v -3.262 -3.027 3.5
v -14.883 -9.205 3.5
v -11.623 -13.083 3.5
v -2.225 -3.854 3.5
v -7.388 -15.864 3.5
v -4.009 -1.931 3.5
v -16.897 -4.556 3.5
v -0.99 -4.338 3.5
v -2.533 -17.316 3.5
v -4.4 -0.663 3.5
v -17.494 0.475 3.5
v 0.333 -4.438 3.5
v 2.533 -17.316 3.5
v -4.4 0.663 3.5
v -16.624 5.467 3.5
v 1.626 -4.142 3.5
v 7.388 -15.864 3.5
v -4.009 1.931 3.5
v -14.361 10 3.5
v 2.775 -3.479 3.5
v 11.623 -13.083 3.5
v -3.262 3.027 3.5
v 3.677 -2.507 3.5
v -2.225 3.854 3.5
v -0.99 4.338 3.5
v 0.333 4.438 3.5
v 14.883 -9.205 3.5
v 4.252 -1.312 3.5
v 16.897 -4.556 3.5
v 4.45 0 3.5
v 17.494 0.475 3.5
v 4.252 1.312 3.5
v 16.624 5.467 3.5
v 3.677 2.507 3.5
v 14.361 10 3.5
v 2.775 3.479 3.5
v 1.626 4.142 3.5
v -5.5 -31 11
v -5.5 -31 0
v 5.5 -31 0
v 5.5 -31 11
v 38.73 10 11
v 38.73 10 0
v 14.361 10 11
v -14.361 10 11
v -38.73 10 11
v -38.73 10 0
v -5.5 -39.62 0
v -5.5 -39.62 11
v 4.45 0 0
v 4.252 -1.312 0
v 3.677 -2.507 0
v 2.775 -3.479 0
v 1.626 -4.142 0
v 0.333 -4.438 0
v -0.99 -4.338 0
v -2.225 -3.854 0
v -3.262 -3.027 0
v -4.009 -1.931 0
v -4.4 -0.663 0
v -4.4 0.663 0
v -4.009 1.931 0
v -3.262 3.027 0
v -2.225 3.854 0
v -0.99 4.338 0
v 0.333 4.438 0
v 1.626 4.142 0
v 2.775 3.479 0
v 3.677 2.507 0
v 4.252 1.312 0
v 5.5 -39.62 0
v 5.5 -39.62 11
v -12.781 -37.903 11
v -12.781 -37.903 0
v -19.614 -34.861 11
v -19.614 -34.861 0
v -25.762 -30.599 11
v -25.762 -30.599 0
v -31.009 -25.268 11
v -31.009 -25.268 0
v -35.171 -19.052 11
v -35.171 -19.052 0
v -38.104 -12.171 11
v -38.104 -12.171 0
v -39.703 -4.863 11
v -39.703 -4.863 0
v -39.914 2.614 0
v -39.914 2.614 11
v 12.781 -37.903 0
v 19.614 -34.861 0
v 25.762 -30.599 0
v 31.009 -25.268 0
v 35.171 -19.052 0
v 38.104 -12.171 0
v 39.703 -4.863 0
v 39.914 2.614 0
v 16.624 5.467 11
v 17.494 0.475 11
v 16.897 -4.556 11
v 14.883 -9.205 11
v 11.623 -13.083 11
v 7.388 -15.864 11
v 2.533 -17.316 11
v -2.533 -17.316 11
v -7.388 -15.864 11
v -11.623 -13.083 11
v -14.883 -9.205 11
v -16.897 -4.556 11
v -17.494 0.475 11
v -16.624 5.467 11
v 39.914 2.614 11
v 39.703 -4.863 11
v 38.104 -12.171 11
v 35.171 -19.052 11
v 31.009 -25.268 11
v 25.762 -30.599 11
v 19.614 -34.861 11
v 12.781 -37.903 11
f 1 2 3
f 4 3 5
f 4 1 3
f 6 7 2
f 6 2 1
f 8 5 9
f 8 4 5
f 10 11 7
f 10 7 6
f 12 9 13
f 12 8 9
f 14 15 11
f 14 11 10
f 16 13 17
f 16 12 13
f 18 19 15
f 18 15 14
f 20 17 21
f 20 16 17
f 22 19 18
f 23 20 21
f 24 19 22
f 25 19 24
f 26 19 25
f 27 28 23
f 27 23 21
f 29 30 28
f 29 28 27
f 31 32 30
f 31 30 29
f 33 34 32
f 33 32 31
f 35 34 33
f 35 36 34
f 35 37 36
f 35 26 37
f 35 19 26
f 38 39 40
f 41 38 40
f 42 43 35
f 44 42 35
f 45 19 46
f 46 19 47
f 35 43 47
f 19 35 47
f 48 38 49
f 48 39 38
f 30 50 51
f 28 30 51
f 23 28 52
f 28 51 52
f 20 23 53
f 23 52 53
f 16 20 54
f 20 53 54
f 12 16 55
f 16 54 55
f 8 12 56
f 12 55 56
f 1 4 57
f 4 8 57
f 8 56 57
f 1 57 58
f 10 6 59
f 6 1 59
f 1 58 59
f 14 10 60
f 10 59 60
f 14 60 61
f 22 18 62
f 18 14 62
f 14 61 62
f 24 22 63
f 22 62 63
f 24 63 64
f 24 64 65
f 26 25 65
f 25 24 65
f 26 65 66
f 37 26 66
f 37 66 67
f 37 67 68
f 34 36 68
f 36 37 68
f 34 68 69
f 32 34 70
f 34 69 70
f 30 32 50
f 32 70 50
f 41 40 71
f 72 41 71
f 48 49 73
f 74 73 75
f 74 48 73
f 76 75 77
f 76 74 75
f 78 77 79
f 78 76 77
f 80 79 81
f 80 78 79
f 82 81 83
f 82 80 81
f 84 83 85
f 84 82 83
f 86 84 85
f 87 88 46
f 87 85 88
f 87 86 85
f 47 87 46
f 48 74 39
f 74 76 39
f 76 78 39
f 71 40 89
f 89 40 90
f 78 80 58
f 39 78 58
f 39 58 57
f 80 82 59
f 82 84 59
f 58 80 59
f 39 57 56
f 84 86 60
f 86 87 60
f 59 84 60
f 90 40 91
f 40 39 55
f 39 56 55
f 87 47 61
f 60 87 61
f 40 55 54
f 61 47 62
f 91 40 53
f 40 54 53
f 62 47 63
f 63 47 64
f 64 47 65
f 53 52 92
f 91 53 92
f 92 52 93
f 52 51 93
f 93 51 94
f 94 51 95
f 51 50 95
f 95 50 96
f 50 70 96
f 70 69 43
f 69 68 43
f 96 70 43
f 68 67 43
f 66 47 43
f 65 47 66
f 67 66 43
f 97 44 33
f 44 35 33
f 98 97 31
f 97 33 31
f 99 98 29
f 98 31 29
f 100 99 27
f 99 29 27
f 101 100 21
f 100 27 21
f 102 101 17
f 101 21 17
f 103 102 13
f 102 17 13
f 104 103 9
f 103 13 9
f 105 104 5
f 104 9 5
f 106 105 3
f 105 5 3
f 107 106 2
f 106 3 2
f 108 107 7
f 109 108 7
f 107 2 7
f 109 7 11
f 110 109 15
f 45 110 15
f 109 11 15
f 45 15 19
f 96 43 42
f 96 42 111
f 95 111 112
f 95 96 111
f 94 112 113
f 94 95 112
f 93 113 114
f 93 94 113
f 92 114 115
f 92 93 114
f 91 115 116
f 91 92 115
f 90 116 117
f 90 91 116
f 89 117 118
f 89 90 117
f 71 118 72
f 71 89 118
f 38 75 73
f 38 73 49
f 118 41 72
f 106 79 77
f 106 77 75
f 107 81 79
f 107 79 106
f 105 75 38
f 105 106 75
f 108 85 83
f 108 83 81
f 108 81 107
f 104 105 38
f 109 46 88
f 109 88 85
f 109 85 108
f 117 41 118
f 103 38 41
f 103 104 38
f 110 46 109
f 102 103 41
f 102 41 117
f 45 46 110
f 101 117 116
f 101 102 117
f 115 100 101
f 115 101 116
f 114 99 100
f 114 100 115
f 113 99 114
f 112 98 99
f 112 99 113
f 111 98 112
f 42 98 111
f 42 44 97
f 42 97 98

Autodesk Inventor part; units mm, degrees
ref_plane "YZ Plane" through (0, 0, 0) normal (1, 0, 0) x (0, 1, 0)
ref_plane "XZ Plane" through (0, 0, 0) normal (0, 1, 0) x (-1, 0, 0)
ref_plane "XY Plane" through (0, 0, 0) normal (0, 0, 1) x (1, 0, 0)
sketch "Эскиз1" plane through (0, 0, 0) normal (0, 0, 1) x (1, 0, 0)
  line L0 (0, 0) -> (-6, 0) construction
  line L1 (-6, 0) -> (-6, -27.9727) construction
  line L2 (-6, -27.9727) -> (0, -27.9727) construction
  line L3 (0, -27.9727) -> (0, 0) construction
  line L4 (6, -39.5474) -> (6, -29.5474)
  line L5 (6, -29.5474) -> (-6, -29.5474)
  line L6 (-6, -29.5474) -> (-6, -39.5474)
  circle A0 centre (0, 0) radius 4.45
  circle A1 centre (0, 0) radius 40
  line L7 (29.5474, -6) -> (39.5474, -6)
  line L8 (29.5474, 6) -> (29.5474, -6)
  line L9 (39.5474, 6) -> (29.5474, 6)
  line L10 (6, 29.5474) -> (6, 39.5474)
  line L11 (-6, 29.5474) -> (6, 29.5474)
  line L12 (-6, 39.5474) -> (-6, 29.5474)
  line L13 (-29.5474, 6) -> (-39.5474, 6)
  line L14 (-29.5474, -6) -> (-29.5474, 6)
  line L15 (-39.5474, -6) -> (-29.5474, -6)
  line L16 (38.7298, 10) -> (-38.7298, 10)
  circle A2 centre (0, 0) radius 17.5
  line L17 (0, -40) -> (0, -31)
  line L18 (0, -31) -> (-6, -31)
  line L19 (0, -31) -> (6, -31)
  line L20 (5.5, -29.5474) -> (5.5, -39.6201)
  line L21 (-5.5, -29.5474) -> (-5.5, -39.6201)
  point P0 (6, -34.4819)
  point P1 (6, -27.9727)
  point P2 (6, -39.5474)
  point P3 (6, -39.5474)
  point P4 (-14.3614, 10)
  point P5 (14.3614, 10)
  point P6 (5.5, -31)
  point P7 (-5.5, -31)
  dimension "d1" = 6
  dimension "d2" = 12
  dimension "d3" = 10
  dimension "d6" = 8.9
  dimension "d12" = 80
  dimension "d15" = 360
  dimension "d19" = 35
  dimension "d24" = 9
  dimension "d25" = 0.5
ref_plane "РабПлоскость2" through (0, 0, 0.2) normal (0, 0, 1) x (1, 0, 0)
extrude "Выдавливание4" add sketch "Эскиз1" along normal blind 3.5 contours A2 L16 picked at (-0.1788, 8.1392)
extrude "Выдавливание5" add sketch "Эскиз1" along normal blind 11 contours A1 L20 L19 L4 | L4 L5 L6 A1 L15 L14 L13 L16 A2 L9 L8 L7 | L19 L20 L5 L4 | L7 L8 L9 A1 | L19 L18 L21 L5 L20 | A1 L6 L18 L21 | L21 L18 L6 L5 | A1 L13 L14 L15
properties part number "circle"
